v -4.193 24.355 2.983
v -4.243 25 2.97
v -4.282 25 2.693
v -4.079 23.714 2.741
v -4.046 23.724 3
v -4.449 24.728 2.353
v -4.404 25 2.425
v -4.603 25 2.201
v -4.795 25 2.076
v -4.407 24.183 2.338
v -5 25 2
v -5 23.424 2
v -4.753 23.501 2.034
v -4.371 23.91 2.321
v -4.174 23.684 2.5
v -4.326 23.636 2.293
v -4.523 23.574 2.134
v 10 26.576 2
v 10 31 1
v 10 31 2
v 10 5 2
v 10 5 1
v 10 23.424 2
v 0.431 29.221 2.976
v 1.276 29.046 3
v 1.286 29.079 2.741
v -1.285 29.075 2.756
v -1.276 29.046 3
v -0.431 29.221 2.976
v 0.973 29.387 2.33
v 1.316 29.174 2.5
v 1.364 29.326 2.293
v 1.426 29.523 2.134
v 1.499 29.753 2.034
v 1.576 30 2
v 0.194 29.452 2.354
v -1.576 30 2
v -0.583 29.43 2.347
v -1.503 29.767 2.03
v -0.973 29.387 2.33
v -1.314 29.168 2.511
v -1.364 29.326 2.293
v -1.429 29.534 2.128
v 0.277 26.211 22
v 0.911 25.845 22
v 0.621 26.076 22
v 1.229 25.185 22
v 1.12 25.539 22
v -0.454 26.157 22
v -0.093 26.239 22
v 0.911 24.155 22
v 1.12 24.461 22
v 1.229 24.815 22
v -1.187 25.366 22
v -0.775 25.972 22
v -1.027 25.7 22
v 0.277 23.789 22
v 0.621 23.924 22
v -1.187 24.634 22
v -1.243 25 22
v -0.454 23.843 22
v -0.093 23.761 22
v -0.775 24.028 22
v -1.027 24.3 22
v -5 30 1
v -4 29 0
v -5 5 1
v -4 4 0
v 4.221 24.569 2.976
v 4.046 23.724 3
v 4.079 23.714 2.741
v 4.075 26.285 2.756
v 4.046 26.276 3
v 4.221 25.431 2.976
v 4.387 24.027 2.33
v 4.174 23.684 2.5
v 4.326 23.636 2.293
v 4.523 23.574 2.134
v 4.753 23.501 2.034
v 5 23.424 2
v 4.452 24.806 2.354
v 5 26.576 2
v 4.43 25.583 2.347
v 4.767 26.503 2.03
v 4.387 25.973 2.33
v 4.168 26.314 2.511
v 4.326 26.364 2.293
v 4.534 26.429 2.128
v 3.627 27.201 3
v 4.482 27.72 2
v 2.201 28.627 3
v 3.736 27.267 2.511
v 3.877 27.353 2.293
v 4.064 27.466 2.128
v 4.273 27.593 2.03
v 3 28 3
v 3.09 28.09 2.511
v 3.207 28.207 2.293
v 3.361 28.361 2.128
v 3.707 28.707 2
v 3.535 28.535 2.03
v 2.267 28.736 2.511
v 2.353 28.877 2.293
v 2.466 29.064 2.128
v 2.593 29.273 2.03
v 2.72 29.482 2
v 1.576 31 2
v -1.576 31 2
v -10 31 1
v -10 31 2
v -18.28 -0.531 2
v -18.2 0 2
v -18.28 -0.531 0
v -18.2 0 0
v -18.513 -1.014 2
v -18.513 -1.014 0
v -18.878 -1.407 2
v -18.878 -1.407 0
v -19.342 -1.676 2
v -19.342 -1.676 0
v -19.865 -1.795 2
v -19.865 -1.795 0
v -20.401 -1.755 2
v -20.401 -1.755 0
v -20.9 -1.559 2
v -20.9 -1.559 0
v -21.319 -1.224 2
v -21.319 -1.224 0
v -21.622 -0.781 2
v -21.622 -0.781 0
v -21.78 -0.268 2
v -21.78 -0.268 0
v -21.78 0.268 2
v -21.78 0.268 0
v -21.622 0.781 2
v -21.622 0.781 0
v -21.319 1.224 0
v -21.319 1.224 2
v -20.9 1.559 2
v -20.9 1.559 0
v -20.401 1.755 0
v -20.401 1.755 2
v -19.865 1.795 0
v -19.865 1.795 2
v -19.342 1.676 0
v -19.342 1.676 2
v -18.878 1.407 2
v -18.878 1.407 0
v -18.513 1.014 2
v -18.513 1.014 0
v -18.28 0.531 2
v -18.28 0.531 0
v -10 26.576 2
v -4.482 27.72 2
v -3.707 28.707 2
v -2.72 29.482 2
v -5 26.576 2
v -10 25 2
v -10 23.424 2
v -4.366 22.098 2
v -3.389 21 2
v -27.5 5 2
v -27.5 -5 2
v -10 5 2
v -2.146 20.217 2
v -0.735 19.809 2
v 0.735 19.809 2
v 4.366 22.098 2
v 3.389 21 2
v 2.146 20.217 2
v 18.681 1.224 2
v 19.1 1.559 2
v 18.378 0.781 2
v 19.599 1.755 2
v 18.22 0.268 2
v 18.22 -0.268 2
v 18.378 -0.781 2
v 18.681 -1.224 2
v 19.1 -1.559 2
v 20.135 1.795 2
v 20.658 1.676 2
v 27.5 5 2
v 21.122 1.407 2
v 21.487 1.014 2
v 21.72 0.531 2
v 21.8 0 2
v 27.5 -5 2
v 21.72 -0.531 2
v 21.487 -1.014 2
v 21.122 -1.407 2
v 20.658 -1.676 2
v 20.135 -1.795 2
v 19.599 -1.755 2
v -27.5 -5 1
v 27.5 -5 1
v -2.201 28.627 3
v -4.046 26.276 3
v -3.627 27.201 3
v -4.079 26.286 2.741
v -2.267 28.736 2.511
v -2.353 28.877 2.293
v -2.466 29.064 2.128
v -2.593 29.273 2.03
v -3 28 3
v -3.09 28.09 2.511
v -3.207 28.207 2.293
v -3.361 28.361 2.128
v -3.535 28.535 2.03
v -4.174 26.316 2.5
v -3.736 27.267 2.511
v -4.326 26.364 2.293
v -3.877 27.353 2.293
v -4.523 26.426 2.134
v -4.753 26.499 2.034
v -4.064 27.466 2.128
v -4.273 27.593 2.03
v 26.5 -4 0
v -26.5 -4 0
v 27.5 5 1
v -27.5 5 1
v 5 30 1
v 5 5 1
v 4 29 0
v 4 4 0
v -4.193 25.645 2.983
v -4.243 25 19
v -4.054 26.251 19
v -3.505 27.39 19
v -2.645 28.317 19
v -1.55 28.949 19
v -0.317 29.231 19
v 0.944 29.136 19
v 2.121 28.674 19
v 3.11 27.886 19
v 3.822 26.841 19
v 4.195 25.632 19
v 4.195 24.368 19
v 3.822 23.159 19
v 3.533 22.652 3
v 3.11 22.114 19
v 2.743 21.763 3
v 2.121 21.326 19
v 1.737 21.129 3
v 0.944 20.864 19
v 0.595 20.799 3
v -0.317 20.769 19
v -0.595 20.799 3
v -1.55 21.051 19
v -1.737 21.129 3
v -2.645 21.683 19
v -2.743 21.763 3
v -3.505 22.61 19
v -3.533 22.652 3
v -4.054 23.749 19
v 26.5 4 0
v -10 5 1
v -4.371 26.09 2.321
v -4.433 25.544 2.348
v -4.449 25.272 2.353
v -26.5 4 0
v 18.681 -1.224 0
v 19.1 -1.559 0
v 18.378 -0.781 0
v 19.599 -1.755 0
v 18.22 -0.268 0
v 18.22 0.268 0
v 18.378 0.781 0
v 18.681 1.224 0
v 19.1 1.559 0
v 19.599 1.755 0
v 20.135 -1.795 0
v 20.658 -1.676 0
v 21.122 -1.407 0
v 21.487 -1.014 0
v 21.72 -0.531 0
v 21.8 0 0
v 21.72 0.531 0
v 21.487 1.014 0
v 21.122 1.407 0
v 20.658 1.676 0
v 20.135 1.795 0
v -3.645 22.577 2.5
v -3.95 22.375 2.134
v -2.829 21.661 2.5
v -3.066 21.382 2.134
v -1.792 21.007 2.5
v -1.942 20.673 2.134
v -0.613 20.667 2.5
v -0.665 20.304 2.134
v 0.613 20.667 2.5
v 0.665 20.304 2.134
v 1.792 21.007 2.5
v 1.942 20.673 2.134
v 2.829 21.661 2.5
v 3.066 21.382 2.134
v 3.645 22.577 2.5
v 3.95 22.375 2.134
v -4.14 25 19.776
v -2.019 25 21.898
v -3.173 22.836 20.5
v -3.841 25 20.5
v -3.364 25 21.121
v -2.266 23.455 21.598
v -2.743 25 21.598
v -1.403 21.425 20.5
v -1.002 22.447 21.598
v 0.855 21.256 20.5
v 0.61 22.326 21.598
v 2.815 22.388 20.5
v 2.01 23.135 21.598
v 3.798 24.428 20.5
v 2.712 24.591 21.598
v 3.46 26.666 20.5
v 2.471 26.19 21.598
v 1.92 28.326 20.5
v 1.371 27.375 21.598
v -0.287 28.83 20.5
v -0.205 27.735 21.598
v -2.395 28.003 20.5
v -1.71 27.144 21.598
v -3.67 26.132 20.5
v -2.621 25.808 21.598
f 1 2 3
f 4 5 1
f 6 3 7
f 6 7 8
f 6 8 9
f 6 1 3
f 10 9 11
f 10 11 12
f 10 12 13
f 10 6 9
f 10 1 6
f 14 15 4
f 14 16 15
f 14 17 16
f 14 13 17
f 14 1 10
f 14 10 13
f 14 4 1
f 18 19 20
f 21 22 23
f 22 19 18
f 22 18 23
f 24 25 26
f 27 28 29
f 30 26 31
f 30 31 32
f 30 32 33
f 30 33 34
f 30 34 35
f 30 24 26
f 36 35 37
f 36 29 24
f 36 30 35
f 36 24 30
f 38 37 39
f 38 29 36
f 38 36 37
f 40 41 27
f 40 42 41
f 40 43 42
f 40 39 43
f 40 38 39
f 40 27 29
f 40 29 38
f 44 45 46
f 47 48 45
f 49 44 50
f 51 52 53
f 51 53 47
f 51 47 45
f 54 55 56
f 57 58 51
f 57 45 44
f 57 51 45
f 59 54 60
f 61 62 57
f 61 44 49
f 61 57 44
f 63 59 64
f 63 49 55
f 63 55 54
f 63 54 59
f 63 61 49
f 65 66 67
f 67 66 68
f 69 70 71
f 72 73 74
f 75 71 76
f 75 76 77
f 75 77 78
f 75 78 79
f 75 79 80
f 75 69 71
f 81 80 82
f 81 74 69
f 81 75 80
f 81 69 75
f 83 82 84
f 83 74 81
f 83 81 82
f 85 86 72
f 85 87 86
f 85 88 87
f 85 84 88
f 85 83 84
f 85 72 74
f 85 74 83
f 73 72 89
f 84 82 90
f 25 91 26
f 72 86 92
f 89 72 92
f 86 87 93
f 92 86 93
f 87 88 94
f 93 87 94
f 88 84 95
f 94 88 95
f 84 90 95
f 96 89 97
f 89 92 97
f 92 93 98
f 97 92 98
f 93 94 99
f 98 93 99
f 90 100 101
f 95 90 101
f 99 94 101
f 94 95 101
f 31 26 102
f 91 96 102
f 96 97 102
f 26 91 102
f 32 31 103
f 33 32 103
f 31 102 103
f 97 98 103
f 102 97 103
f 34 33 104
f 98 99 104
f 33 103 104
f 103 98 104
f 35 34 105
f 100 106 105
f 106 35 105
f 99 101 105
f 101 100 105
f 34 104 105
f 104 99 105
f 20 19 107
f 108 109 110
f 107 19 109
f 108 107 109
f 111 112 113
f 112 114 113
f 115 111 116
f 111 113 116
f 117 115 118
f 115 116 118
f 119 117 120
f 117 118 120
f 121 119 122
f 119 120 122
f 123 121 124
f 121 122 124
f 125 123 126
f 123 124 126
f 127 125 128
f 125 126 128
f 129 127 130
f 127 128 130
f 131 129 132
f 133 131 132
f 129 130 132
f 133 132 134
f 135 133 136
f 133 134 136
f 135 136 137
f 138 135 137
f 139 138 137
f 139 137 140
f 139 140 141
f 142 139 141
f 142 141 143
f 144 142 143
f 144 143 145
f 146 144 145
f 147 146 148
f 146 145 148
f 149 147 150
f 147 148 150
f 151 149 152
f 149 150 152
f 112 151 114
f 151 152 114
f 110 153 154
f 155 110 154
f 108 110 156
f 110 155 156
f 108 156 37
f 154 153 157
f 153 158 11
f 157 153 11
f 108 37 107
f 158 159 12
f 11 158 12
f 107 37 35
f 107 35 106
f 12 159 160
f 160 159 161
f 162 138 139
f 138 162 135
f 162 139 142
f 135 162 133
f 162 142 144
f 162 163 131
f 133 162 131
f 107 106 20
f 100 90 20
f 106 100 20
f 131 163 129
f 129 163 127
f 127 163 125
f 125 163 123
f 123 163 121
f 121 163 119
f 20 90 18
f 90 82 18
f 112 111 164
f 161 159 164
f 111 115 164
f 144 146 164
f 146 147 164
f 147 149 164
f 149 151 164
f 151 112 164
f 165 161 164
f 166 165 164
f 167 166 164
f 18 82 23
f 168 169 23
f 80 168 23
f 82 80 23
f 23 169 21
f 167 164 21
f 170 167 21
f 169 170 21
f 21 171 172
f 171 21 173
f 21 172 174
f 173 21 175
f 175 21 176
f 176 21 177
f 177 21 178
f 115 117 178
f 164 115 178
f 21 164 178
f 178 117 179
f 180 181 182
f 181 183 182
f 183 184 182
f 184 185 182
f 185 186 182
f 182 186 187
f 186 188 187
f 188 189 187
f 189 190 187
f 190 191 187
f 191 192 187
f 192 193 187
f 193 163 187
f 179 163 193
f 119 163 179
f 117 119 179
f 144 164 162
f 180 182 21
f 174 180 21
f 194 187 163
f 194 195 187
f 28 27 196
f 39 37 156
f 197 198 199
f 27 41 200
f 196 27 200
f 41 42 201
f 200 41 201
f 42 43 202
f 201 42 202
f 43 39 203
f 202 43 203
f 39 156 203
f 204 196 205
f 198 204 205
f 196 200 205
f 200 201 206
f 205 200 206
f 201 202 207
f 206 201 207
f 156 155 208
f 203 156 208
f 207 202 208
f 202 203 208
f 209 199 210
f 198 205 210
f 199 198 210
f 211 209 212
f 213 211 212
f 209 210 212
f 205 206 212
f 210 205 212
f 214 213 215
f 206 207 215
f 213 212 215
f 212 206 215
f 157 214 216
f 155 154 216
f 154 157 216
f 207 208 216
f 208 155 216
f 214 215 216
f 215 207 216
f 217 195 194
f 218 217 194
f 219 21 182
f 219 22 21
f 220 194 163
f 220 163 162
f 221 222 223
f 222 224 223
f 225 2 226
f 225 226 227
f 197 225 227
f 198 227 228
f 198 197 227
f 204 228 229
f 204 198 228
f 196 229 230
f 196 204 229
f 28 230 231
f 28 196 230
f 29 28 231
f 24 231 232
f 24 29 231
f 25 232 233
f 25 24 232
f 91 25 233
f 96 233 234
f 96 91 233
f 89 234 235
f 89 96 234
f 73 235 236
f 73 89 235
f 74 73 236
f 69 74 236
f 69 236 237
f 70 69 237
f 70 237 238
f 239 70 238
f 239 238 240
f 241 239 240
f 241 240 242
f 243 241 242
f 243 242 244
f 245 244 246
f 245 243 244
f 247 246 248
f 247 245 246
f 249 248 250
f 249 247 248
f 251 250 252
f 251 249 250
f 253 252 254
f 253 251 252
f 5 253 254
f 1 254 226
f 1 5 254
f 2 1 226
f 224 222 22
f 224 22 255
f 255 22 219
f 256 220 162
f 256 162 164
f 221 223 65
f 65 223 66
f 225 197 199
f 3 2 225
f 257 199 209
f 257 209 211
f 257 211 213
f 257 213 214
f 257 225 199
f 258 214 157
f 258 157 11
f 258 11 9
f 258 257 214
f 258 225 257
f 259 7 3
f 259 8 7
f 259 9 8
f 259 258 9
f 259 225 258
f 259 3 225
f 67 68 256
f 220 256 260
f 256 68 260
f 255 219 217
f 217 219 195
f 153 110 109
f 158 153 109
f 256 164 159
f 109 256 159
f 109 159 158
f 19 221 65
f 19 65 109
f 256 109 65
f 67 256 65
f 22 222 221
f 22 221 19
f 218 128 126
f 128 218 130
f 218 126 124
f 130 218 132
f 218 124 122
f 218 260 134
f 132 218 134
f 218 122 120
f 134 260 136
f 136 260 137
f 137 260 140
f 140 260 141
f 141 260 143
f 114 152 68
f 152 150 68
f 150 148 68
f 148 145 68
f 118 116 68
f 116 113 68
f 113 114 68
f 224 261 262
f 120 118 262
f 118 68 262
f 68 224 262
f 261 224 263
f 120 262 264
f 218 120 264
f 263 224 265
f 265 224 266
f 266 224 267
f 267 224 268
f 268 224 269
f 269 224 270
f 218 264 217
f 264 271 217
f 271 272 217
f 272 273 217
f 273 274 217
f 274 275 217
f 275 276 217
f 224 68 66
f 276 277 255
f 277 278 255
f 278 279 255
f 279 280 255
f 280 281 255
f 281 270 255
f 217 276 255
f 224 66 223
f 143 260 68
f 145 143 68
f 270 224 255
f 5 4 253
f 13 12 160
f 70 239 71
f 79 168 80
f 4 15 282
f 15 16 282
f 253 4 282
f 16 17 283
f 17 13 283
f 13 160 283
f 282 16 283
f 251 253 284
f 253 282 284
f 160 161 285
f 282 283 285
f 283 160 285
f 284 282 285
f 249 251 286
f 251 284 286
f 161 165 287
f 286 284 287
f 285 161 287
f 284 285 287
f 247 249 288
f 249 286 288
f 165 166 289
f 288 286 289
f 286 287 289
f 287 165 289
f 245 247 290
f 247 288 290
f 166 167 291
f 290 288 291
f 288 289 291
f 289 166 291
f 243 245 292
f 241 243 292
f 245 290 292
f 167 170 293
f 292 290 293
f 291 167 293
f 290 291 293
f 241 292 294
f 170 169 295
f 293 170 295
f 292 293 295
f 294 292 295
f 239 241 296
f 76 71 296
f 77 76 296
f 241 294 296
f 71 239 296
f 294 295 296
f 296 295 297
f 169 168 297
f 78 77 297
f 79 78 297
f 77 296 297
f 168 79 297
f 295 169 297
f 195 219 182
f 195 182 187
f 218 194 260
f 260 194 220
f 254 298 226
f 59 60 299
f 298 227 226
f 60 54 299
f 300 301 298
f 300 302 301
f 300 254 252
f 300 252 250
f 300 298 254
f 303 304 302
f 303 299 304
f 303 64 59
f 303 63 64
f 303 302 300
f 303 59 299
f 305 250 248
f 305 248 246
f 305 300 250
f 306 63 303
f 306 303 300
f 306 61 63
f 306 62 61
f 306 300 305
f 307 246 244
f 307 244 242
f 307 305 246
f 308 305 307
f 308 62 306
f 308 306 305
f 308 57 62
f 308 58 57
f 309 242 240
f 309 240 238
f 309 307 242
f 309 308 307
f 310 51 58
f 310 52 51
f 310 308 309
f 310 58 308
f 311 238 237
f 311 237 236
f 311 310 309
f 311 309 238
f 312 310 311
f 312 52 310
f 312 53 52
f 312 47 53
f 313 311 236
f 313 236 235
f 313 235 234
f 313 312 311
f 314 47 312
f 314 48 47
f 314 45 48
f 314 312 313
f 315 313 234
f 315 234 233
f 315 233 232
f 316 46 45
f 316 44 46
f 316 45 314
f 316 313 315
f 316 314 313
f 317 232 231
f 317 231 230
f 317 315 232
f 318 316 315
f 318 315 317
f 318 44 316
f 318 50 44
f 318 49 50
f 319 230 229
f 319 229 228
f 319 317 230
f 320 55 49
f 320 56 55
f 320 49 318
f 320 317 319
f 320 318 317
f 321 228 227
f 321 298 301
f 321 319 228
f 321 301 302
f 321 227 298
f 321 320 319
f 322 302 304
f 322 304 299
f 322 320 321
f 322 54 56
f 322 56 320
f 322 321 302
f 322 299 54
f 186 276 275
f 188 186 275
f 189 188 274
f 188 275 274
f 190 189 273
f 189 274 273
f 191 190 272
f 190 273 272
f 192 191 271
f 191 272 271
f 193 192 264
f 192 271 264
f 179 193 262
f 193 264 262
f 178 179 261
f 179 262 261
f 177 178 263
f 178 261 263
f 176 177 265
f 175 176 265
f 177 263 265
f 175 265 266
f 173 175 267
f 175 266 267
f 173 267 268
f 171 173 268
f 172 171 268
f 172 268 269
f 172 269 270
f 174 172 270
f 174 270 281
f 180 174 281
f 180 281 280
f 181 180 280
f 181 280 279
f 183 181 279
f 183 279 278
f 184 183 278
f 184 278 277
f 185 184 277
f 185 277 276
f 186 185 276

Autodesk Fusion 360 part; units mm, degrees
sketch "Sketch1" plane through (0, 0, 0) normal (0, 0, 1) x (1, 0, 0)
  line L0 (-27.5, 5) -> (27.5, 5)
  line L1 (27.5, 5) -> (27.5, -5)
  line L2 (27.5, -5) -> (-27.5, -5)
  line L3 (-27.5, -5) -> (-27.5, 5)
  line L4 (-27.5, 5) -> (27.5, -5) construction
  line L5 (27.5, 5) -> (-27.5, -5) construction
  dimension "d1" = 55
  dimension "d2" = 10
sketch "Sketch2" plane through (0, 0, 0) normal (0, 0, 1) x (1, 0, 0)
  line L0 (-27.5, 0) -> (-20, 0) construction
  line L1 (27.5, 0) -> (20, 0) construction
  dimension "d3" = 7.5
  dimension "d4" = 7.5
sketch "Sketch3" plane through (0, 0, 0) normal (0, 0, 1) x (1, 0, 0)
  circle A0 centre (-20, 0) radius 1.8
  circle A1 centre (20, 0) radius 1.8
  dimension "d7" = 3.6
  dimension "d8" = 3.6
extrude "Extrude1" add sketch "Sketch1" along normal blind 2
extrude "Extrude2" cut sketch "Sketch3" along normal blind 10
sketch "Sketch5" plane through (0, 5, 0) normal (0, 1, 0) x (-1, 0, 0)
  line L0 (-27.5, 0) -> (27.5, 0)
  line L1 (27.5, 0) -> (27.5, 2)
  line L2 (27.5, 2) -> (-27.5, 2)
  line L3 (-27.5, 2) -> (-27.5, 0)
  line L4 (-5, 2) -> (5, 2)
  line L5 (5, 2) -> (5, 0)
  line L6 (5, 0) -> (-5, 0)
  line L7 (-5, 0) -> (-5, 2)
extrude "Extrude3" add sketch "Sketch5" along normal blind 25 contours L0 L2 L4 L5 L6 L7
sketch "Sketch6" plane through (0, 0, 2) normal (0, 0, 1) x (-1, 0, 0)
  circle A0 centre (-20, 0) radius 1.8
  circle A1 centre (20, 0) radius 1.8
  line L0 (27.5, 5) -> (-27.5, 5)
  line L1 (-27.5, 5) -> (-27.5, -5)
  line L2 (-27.5, -5) -> (-5, -5)
  line L3 (-5, -5) -> (-5, -30)
  line L4 (-5, -30) -> (5, -30)
  line L5 (5, -30) -> (5, -5)
  line L6 (5, -5) -> (27.5, -5)
  line L7 (27.5, -5) -> (27.5, 5)
  circle A2 centre (0, -25) radius 4.2426
extrude "Extrude4" add sketch "Sketch6" along normal blind 20 contours A2
fillet "Fillet1" radius 3 1 edges at (3.9555, 26.5342, 22)
fillet "Fillet2" radius 1 1 edges at (3.9555, 23.4658, 2)
chamfer "Chamfer1" distance 1 angle 45 8 edges at (-5, 17.5, 0) (5, 17.5, 0) (0, 30, 0) (-16.25, 5, 0) (-27.5, 0, 0) (0, -5, 0) (27.5, 0, 0) (16.25, 5, 0)
extrude "Extrude5" add 1 faces at (-5, 19.4745, 1.3333) along direction (-1, 0, 0) blind 5
extrude "Extrude6" add 1 faces at (5, 19.4745, 1.3333) along direction (1, 0, 0) blind 5
extrude "Extrude7" add 1 faces at (-0.5255, 30, 1.3333) along direction (0, 1, 0) blind 5
extrude "Extrude8" cut 1 faces at (1.6667, 35, 1.3333) along direction (0, -1, 0) blind 4
